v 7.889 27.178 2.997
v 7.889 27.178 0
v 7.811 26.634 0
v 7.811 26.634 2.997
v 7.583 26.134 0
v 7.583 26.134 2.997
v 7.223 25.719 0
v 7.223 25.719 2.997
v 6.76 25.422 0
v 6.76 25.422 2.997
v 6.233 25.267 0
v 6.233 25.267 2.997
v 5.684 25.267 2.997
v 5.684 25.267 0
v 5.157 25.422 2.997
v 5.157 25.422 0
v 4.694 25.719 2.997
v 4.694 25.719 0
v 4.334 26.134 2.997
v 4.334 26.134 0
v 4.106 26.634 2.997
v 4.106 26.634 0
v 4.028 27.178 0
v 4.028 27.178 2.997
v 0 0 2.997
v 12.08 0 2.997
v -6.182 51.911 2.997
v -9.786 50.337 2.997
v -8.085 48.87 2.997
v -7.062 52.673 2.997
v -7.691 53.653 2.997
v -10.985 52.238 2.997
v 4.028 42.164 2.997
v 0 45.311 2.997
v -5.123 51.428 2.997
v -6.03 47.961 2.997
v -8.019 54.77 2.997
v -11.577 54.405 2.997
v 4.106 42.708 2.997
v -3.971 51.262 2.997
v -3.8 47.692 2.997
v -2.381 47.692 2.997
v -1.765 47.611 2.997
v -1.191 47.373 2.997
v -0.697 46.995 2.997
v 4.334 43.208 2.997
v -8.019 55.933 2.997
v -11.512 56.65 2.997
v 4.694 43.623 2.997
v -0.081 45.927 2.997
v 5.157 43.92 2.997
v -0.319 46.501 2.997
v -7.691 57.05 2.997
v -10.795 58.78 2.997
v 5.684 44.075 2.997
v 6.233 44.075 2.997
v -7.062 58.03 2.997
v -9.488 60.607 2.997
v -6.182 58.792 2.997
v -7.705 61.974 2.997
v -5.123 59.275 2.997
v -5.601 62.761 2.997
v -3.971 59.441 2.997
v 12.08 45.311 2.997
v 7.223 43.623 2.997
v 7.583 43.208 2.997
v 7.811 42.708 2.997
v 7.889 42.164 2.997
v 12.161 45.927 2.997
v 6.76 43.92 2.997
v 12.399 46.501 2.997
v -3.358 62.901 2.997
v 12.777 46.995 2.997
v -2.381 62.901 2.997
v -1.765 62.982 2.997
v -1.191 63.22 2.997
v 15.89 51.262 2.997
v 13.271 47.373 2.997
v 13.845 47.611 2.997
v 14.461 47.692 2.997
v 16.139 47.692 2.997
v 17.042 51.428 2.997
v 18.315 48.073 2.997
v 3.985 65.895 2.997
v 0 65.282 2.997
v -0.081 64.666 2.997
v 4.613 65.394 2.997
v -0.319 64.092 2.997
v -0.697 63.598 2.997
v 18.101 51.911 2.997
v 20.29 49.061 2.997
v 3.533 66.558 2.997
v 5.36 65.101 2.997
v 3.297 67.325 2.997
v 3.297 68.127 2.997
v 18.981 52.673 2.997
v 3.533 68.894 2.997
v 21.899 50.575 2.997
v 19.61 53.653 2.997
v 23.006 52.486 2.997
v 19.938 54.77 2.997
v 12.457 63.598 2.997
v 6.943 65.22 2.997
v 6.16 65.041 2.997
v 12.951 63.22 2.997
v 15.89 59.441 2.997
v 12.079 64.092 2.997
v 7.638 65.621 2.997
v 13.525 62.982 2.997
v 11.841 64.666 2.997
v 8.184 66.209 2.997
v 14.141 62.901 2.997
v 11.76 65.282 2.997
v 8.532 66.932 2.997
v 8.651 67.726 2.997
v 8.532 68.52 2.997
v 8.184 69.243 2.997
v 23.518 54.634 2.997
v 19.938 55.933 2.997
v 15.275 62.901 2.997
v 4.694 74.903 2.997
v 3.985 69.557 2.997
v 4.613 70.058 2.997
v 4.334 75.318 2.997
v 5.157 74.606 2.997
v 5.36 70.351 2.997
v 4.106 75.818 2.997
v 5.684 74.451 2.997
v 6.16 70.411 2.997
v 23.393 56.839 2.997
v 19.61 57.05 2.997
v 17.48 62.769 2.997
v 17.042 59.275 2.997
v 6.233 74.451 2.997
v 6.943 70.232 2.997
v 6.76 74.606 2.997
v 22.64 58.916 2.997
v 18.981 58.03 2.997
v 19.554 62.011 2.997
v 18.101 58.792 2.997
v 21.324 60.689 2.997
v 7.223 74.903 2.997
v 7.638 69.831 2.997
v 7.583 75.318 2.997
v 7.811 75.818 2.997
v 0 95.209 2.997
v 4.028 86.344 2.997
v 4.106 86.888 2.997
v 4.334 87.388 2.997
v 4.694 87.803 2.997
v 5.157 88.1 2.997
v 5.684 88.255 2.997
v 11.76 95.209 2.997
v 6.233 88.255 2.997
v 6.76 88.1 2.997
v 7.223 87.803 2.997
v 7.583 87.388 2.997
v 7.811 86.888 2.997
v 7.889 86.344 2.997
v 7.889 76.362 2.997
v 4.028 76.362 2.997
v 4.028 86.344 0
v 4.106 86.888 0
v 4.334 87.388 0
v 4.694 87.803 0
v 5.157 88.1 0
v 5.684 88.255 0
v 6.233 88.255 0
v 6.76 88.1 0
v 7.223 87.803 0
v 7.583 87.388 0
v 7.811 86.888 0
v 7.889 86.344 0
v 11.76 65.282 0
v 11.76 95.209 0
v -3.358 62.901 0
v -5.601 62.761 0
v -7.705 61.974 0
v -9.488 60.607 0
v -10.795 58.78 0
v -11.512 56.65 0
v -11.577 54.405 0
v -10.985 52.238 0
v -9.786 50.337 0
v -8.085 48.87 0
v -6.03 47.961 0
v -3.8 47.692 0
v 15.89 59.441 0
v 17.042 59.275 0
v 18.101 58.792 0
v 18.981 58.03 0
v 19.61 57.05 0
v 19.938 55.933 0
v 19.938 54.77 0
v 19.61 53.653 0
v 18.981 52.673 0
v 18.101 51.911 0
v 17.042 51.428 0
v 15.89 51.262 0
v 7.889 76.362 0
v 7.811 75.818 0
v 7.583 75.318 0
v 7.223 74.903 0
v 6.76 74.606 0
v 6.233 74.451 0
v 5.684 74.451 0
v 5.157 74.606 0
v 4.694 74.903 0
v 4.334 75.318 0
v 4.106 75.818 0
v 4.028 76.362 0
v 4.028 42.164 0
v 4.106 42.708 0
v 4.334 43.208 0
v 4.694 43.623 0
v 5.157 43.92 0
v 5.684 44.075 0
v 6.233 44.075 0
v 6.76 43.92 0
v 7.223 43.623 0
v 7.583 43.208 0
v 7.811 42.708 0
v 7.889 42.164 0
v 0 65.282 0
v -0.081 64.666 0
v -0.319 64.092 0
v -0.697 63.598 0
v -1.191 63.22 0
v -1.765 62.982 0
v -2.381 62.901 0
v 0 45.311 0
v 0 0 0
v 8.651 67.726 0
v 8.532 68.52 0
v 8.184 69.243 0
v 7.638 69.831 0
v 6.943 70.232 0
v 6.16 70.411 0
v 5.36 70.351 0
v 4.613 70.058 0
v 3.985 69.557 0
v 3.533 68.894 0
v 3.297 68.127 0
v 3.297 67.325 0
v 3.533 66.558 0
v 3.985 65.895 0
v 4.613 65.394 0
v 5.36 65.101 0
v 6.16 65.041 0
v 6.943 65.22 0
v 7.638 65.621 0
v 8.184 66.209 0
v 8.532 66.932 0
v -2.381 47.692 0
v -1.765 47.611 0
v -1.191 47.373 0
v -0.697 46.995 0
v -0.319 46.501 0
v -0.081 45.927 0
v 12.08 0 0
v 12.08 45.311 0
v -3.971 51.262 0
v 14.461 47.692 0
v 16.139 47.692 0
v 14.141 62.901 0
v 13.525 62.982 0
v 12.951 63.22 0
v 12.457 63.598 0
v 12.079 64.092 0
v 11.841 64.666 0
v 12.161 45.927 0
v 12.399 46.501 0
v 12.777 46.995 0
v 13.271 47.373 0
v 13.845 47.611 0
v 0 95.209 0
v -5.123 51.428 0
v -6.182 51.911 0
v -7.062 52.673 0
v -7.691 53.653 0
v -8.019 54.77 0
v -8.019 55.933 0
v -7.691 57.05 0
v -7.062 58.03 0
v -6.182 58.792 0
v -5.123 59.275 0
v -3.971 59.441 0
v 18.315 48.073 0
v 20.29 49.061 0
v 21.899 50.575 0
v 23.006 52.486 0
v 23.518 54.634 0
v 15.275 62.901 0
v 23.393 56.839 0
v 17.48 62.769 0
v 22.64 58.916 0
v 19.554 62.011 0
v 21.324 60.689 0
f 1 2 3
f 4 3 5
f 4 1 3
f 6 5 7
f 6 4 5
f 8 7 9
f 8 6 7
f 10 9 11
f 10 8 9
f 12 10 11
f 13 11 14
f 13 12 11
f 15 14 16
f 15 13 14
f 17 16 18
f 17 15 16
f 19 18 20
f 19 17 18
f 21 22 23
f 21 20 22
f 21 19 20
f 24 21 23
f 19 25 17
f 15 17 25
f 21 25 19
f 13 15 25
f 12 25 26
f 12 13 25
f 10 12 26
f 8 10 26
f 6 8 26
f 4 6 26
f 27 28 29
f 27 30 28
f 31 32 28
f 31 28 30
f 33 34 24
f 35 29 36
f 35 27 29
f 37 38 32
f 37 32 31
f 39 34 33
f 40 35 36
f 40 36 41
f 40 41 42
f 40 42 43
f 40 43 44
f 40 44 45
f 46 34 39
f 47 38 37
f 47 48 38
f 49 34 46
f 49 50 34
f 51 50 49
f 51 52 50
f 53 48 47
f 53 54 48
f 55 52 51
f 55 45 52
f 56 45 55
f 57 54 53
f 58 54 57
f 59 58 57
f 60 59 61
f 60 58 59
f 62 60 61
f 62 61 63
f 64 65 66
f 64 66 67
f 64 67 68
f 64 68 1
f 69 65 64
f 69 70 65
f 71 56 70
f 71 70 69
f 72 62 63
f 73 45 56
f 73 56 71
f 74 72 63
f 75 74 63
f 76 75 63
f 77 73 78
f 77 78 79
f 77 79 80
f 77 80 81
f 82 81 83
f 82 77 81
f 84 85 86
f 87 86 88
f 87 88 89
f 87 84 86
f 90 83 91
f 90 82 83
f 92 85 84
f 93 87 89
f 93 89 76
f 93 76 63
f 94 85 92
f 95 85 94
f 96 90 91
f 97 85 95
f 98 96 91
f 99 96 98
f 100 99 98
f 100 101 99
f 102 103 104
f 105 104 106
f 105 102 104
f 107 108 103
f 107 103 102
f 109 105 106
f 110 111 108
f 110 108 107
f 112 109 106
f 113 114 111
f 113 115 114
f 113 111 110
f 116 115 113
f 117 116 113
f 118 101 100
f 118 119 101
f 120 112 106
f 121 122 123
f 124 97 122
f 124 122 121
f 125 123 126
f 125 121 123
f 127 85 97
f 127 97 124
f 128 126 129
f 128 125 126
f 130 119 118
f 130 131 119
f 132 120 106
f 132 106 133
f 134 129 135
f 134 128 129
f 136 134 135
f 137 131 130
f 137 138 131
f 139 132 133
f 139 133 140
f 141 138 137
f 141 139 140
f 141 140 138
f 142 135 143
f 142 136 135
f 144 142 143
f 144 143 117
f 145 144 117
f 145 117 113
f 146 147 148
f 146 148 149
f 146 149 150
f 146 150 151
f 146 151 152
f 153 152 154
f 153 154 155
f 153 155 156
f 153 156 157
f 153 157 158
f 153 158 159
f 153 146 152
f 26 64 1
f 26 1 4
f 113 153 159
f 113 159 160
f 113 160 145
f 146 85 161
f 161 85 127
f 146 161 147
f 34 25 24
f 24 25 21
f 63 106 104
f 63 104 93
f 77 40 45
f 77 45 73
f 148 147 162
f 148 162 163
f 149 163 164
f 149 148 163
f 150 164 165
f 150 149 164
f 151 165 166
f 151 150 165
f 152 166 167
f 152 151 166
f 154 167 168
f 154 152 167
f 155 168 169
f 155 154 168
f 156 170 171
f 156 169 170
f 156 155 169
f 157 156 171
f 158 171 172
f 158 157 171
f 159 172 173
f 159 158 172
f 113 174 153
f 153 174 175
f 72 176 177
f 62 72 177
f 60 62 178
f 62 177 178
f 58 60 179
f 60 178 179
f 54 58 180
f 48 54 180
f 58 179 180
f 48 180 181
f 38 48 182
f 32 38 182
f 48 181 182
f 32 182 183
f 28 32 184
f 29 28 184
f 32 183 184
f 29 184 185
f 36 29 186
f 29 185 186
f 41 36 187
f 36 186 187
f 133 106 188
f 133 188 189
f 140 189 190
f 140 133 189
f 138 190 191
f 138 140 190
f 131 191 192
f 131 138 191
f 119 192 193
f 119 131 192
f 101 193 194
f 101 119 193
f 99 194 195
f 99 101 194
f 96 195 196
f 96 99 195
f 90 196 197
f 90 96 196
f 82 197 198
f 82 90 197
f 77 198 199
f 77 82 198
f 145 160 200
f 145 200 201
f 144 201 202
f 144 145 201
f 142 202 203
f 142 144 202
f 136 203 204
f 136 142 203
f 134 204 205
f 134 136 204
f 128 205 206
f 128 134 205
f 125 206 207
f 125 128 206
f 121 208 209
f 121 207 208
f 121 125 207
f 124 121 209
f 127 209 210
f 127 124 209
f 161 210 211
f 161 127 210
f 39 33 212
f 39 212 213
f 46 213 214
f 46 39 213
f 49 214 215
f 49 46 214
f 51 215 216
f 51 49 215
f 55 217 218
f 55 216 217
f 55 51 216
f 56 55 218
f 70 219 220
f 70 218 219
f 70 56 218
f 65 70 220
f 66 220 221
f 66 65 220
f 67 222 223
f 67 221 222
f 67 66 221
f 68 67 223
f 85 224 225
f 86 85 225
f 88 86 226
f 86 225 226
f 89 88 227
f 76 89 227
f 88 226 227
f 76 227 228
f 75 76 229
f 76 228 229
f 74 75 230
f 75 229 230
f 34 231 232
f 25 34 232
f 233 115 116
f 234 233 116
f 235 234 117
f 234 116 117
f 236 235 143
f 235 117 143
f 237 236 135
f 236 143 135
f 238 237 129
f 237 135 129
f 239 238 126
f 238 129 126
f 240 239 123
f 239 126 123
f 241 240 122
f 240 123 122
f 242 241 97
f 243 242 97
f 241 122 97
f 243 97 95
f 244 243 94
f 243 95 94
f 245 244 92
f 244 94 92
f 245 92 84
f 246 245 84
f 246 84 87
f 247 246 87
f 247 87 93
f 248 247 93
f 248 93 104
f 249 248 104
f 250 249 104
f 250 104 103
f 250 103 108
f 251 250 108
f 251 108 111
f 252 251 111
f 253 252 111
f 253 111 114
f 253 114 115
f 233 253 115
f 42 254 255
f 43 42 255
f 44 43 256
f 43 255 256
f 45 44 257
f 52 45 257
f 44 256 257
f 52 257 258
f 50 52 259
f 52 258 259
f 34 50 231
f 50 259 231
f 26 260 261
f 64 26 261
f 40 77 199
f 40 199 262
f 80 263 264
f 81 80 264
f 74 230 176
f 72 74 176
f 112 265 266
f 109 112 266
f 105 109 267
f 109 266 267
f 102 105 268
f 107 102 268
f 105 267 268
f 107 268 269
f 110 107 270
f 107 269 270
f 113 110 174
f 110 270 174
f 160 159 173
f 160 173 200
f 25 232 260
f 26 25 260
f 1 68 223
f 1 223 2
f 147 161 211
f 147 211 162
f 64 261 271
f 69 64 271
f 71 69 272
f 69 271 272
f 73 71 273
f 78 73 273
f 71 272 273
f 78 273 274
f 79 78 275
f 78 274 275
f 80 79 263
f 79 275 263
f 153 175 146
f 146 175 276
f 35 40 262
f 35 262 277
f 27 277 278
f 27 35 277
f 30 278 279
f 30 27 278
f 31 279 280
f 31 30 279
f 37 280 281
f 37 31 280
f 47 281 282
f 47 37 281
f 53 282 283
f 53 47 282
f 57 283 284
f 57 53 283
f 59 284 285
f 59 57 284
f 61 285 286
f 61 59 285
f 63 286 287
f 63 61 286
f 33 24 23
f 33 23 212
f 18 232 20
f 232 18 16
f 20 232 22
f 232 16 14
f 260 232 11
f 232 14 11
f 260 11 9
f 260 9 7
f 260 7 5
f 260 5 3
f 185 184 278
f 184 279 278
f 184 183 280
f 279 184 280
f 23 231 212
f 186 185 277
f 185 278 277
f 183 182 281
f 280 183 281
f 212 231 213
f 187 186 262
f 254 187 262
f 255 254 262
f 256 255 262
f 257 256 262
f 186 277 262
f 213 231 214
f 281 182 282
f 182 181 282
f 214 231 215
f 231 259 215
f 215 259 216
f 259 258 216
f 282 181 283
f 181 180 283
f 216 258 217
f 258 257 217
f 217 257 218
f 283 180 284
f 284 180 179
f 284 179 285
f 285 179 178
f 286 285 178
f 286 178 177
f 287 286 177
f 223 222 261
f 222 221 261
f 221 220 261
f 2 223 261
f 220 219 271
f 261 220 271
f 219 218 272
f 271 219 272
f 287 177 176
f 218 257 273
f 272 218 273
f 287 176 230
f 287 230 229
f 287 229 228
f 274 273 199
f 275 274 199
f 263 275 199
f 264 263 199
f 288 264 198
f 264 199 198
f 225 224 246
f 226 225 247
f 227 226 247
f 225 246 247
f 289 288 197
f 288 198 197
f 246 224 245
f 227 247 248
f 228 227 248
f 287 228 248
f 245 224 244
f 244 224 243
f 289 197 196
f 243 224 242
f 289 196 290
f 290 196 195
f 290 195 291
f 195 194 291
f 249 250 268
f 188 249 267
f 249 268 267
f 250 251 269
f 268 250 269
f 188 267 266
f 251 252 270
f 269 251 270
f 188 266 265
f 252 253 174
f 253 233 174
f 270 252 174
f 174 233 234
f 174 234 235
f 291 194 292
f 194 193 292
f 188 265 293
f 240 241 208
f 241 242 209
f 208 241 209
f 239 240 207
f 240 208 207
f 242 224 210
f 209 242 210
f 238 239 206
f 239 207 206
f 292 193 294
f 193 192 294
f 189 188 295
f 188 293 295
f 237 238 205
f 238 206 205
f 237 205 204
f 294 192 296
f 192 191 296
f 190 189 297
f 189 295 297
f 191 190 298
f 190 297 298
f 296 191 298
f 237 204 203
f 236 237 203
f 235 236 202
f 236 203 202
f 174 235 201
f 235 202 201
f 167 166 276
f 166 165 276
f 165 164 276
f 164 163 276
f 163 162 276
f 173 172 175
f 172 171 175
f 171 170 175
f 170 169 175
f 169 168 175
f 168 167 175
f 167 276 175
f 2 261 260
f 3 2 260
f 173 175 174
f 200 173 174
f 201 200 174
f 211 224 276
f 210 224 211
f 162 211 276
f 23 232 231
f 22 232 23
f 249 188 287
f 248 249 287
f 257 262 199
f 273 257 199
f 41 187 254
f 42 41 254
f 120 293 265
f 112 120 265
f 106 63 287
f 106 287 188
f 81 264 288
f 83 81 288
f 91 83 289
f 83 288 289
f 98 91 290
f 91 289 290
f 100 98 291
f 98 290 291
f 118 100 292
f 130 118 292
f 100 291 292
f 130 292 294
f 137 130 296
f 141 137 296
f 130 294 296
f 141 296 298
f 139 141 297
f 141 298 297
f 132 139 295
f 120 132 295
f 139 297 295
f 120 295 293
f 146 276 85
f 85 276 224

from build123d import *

# Parameters (mm, degrees)
BOSS_EXTRUDE1_DEPTH = 2.997
SKETCH2_R           = 2.6925
CUT_EXTRUDE1_DEPTH  = 99.123678721
CUT_EXTRUDE2_DEPTH  = 99.123678721
CUT_EXTRUDE3_DEPTH  = 99.123678721
CUT_EXTRUDE4_DEPTH  = 99.123678721


with BuildPart() as part:
    # Sketch1 → Boss-Extrude1 (new body)
    with BuildSketch(Plane.XY):
        with BuildLine():
            Line((0, 0), (12.08, 0))
            Line((12.08, 0), (12.08, 45.311))
            ThreePointArc((12.08, 45.311), (12.777378754, 46.994621246), (14.461, 47.692))
            Line((14.461, 47.692), (16.139481493, 47.692))
            ThreePointArc((16.139481493, 47.692), (23.535730768, 55.74130609), (15.275362275, 62.901064761))
            Line((15.275362275, 62.901064761), (14.141, 62.901064761))
            ThreePointArc((14.141, 62.901064761), (12.457378754, 63.598443515), (11.76, 65.282064761))
            Line((11.76, 65.282064761), (11.76, 95.209064761))
            Line((11.76, 95.209064761), (0, 95.209064761))
            Line((0, 95.209064761), (0, 65.282064761))
            ThreePointArc((0, 65.282064761), (-0.697378754, 63.598443515), (-2.381, 62.901064761))
            Line((-2.381, 62.901064761), (-3.358362275, 62.901064761))
            ThreePointArc((-3.358362275, 62.901064761), (-11.627796455, 55.52999861), (-3.799518507, 47.692))
            Line((-3.799518507, 47.692), (-2.381, 47.692))
            ThreePointArc((-2.381, 47.692), (-0.697378754, 46.994621246), (0, 45.311))
            Line((0, 45.311), (0, 0))
        make_face()
    extrude(amount=BOSS_EXTRUDE1_DEPTH)

    # Sketch2 → Cut-Extrude1 (cut, through all)
    with BuildSketch(Plane.XY.offset(2.997)):
        with Locations((5.959, 67.726064761)):
            Circle(SKETCH2_R)
    extrude(amount=-CUT_EXTRUDE1_DEPTH, mode=Mode.SUBTRACT)

    # Sketch3 → Cut-Extrude2 (cut, through all)
    with BuildSketch(Plane.XY.offset(2.997)):
        with BuildLine():
            Line((-3.970876758, 59.441), (15.890123242, 59.441))
            ThreePointArc((15.890123242, 59.441), (19.979623242, 55.3515), (15.890123242, 51.262))
            Line((15.890123242, 51.262), (-3.970876758, 51.262))
            ThreePointArc((-3.970876758, 51.262), (-8.060376758, 55.3515), (-3.970876758, 59.441))
        make_face()
    extrude(amount=-CUT_EXTRUDE2_DEPTH, mode=Mode.SUBTRACT)

    # Sketch4 → Cut-Extrude3 (cut, through all)
    with BuildSketch(Plane.XY.offset(2.997)):
        with BuildLine():
            Line((7.889, 86.344064761), (7.889, 76.362064761))
            ThreePointArc((7.889, 76.362064761), (5.9585, 74.431564761), (4.028, 76.362064761))
            Line((4.028, 76.362064761), (4.028, 86.344064761))
            ThreePointArc((4.028, 86.344064761), (5.9585, 88.274564761), (7.889, 86.344064761))
        make_face()
    extrude(amount=-CUT_EXTRUDE3_DEPTH, mode=Mode.SUBTRACT)

    # Sketch5 → Cut-Extrude4 (cut, through all)
    with BuildSketch(Plane.XY.offset(2.997)):
        with BuildLine():
            Line((7.889, 42.164), (7.889, 27.178))
            ThreePointArc((7.889, 27.178), (5.9585, 25.2475), (4.028, 27.178))
            Line((4.028, 27.178), (4.028, 42.164))
            ThreePointArc((4.028, 42.164), (5.9585, 44.0945), (7.889, 42.164))
        make_face()
    extrude(amount=-CUT_EXTRUDE4_DEPTH, mode=Mode.SUBTRACT)


solid = part.part
